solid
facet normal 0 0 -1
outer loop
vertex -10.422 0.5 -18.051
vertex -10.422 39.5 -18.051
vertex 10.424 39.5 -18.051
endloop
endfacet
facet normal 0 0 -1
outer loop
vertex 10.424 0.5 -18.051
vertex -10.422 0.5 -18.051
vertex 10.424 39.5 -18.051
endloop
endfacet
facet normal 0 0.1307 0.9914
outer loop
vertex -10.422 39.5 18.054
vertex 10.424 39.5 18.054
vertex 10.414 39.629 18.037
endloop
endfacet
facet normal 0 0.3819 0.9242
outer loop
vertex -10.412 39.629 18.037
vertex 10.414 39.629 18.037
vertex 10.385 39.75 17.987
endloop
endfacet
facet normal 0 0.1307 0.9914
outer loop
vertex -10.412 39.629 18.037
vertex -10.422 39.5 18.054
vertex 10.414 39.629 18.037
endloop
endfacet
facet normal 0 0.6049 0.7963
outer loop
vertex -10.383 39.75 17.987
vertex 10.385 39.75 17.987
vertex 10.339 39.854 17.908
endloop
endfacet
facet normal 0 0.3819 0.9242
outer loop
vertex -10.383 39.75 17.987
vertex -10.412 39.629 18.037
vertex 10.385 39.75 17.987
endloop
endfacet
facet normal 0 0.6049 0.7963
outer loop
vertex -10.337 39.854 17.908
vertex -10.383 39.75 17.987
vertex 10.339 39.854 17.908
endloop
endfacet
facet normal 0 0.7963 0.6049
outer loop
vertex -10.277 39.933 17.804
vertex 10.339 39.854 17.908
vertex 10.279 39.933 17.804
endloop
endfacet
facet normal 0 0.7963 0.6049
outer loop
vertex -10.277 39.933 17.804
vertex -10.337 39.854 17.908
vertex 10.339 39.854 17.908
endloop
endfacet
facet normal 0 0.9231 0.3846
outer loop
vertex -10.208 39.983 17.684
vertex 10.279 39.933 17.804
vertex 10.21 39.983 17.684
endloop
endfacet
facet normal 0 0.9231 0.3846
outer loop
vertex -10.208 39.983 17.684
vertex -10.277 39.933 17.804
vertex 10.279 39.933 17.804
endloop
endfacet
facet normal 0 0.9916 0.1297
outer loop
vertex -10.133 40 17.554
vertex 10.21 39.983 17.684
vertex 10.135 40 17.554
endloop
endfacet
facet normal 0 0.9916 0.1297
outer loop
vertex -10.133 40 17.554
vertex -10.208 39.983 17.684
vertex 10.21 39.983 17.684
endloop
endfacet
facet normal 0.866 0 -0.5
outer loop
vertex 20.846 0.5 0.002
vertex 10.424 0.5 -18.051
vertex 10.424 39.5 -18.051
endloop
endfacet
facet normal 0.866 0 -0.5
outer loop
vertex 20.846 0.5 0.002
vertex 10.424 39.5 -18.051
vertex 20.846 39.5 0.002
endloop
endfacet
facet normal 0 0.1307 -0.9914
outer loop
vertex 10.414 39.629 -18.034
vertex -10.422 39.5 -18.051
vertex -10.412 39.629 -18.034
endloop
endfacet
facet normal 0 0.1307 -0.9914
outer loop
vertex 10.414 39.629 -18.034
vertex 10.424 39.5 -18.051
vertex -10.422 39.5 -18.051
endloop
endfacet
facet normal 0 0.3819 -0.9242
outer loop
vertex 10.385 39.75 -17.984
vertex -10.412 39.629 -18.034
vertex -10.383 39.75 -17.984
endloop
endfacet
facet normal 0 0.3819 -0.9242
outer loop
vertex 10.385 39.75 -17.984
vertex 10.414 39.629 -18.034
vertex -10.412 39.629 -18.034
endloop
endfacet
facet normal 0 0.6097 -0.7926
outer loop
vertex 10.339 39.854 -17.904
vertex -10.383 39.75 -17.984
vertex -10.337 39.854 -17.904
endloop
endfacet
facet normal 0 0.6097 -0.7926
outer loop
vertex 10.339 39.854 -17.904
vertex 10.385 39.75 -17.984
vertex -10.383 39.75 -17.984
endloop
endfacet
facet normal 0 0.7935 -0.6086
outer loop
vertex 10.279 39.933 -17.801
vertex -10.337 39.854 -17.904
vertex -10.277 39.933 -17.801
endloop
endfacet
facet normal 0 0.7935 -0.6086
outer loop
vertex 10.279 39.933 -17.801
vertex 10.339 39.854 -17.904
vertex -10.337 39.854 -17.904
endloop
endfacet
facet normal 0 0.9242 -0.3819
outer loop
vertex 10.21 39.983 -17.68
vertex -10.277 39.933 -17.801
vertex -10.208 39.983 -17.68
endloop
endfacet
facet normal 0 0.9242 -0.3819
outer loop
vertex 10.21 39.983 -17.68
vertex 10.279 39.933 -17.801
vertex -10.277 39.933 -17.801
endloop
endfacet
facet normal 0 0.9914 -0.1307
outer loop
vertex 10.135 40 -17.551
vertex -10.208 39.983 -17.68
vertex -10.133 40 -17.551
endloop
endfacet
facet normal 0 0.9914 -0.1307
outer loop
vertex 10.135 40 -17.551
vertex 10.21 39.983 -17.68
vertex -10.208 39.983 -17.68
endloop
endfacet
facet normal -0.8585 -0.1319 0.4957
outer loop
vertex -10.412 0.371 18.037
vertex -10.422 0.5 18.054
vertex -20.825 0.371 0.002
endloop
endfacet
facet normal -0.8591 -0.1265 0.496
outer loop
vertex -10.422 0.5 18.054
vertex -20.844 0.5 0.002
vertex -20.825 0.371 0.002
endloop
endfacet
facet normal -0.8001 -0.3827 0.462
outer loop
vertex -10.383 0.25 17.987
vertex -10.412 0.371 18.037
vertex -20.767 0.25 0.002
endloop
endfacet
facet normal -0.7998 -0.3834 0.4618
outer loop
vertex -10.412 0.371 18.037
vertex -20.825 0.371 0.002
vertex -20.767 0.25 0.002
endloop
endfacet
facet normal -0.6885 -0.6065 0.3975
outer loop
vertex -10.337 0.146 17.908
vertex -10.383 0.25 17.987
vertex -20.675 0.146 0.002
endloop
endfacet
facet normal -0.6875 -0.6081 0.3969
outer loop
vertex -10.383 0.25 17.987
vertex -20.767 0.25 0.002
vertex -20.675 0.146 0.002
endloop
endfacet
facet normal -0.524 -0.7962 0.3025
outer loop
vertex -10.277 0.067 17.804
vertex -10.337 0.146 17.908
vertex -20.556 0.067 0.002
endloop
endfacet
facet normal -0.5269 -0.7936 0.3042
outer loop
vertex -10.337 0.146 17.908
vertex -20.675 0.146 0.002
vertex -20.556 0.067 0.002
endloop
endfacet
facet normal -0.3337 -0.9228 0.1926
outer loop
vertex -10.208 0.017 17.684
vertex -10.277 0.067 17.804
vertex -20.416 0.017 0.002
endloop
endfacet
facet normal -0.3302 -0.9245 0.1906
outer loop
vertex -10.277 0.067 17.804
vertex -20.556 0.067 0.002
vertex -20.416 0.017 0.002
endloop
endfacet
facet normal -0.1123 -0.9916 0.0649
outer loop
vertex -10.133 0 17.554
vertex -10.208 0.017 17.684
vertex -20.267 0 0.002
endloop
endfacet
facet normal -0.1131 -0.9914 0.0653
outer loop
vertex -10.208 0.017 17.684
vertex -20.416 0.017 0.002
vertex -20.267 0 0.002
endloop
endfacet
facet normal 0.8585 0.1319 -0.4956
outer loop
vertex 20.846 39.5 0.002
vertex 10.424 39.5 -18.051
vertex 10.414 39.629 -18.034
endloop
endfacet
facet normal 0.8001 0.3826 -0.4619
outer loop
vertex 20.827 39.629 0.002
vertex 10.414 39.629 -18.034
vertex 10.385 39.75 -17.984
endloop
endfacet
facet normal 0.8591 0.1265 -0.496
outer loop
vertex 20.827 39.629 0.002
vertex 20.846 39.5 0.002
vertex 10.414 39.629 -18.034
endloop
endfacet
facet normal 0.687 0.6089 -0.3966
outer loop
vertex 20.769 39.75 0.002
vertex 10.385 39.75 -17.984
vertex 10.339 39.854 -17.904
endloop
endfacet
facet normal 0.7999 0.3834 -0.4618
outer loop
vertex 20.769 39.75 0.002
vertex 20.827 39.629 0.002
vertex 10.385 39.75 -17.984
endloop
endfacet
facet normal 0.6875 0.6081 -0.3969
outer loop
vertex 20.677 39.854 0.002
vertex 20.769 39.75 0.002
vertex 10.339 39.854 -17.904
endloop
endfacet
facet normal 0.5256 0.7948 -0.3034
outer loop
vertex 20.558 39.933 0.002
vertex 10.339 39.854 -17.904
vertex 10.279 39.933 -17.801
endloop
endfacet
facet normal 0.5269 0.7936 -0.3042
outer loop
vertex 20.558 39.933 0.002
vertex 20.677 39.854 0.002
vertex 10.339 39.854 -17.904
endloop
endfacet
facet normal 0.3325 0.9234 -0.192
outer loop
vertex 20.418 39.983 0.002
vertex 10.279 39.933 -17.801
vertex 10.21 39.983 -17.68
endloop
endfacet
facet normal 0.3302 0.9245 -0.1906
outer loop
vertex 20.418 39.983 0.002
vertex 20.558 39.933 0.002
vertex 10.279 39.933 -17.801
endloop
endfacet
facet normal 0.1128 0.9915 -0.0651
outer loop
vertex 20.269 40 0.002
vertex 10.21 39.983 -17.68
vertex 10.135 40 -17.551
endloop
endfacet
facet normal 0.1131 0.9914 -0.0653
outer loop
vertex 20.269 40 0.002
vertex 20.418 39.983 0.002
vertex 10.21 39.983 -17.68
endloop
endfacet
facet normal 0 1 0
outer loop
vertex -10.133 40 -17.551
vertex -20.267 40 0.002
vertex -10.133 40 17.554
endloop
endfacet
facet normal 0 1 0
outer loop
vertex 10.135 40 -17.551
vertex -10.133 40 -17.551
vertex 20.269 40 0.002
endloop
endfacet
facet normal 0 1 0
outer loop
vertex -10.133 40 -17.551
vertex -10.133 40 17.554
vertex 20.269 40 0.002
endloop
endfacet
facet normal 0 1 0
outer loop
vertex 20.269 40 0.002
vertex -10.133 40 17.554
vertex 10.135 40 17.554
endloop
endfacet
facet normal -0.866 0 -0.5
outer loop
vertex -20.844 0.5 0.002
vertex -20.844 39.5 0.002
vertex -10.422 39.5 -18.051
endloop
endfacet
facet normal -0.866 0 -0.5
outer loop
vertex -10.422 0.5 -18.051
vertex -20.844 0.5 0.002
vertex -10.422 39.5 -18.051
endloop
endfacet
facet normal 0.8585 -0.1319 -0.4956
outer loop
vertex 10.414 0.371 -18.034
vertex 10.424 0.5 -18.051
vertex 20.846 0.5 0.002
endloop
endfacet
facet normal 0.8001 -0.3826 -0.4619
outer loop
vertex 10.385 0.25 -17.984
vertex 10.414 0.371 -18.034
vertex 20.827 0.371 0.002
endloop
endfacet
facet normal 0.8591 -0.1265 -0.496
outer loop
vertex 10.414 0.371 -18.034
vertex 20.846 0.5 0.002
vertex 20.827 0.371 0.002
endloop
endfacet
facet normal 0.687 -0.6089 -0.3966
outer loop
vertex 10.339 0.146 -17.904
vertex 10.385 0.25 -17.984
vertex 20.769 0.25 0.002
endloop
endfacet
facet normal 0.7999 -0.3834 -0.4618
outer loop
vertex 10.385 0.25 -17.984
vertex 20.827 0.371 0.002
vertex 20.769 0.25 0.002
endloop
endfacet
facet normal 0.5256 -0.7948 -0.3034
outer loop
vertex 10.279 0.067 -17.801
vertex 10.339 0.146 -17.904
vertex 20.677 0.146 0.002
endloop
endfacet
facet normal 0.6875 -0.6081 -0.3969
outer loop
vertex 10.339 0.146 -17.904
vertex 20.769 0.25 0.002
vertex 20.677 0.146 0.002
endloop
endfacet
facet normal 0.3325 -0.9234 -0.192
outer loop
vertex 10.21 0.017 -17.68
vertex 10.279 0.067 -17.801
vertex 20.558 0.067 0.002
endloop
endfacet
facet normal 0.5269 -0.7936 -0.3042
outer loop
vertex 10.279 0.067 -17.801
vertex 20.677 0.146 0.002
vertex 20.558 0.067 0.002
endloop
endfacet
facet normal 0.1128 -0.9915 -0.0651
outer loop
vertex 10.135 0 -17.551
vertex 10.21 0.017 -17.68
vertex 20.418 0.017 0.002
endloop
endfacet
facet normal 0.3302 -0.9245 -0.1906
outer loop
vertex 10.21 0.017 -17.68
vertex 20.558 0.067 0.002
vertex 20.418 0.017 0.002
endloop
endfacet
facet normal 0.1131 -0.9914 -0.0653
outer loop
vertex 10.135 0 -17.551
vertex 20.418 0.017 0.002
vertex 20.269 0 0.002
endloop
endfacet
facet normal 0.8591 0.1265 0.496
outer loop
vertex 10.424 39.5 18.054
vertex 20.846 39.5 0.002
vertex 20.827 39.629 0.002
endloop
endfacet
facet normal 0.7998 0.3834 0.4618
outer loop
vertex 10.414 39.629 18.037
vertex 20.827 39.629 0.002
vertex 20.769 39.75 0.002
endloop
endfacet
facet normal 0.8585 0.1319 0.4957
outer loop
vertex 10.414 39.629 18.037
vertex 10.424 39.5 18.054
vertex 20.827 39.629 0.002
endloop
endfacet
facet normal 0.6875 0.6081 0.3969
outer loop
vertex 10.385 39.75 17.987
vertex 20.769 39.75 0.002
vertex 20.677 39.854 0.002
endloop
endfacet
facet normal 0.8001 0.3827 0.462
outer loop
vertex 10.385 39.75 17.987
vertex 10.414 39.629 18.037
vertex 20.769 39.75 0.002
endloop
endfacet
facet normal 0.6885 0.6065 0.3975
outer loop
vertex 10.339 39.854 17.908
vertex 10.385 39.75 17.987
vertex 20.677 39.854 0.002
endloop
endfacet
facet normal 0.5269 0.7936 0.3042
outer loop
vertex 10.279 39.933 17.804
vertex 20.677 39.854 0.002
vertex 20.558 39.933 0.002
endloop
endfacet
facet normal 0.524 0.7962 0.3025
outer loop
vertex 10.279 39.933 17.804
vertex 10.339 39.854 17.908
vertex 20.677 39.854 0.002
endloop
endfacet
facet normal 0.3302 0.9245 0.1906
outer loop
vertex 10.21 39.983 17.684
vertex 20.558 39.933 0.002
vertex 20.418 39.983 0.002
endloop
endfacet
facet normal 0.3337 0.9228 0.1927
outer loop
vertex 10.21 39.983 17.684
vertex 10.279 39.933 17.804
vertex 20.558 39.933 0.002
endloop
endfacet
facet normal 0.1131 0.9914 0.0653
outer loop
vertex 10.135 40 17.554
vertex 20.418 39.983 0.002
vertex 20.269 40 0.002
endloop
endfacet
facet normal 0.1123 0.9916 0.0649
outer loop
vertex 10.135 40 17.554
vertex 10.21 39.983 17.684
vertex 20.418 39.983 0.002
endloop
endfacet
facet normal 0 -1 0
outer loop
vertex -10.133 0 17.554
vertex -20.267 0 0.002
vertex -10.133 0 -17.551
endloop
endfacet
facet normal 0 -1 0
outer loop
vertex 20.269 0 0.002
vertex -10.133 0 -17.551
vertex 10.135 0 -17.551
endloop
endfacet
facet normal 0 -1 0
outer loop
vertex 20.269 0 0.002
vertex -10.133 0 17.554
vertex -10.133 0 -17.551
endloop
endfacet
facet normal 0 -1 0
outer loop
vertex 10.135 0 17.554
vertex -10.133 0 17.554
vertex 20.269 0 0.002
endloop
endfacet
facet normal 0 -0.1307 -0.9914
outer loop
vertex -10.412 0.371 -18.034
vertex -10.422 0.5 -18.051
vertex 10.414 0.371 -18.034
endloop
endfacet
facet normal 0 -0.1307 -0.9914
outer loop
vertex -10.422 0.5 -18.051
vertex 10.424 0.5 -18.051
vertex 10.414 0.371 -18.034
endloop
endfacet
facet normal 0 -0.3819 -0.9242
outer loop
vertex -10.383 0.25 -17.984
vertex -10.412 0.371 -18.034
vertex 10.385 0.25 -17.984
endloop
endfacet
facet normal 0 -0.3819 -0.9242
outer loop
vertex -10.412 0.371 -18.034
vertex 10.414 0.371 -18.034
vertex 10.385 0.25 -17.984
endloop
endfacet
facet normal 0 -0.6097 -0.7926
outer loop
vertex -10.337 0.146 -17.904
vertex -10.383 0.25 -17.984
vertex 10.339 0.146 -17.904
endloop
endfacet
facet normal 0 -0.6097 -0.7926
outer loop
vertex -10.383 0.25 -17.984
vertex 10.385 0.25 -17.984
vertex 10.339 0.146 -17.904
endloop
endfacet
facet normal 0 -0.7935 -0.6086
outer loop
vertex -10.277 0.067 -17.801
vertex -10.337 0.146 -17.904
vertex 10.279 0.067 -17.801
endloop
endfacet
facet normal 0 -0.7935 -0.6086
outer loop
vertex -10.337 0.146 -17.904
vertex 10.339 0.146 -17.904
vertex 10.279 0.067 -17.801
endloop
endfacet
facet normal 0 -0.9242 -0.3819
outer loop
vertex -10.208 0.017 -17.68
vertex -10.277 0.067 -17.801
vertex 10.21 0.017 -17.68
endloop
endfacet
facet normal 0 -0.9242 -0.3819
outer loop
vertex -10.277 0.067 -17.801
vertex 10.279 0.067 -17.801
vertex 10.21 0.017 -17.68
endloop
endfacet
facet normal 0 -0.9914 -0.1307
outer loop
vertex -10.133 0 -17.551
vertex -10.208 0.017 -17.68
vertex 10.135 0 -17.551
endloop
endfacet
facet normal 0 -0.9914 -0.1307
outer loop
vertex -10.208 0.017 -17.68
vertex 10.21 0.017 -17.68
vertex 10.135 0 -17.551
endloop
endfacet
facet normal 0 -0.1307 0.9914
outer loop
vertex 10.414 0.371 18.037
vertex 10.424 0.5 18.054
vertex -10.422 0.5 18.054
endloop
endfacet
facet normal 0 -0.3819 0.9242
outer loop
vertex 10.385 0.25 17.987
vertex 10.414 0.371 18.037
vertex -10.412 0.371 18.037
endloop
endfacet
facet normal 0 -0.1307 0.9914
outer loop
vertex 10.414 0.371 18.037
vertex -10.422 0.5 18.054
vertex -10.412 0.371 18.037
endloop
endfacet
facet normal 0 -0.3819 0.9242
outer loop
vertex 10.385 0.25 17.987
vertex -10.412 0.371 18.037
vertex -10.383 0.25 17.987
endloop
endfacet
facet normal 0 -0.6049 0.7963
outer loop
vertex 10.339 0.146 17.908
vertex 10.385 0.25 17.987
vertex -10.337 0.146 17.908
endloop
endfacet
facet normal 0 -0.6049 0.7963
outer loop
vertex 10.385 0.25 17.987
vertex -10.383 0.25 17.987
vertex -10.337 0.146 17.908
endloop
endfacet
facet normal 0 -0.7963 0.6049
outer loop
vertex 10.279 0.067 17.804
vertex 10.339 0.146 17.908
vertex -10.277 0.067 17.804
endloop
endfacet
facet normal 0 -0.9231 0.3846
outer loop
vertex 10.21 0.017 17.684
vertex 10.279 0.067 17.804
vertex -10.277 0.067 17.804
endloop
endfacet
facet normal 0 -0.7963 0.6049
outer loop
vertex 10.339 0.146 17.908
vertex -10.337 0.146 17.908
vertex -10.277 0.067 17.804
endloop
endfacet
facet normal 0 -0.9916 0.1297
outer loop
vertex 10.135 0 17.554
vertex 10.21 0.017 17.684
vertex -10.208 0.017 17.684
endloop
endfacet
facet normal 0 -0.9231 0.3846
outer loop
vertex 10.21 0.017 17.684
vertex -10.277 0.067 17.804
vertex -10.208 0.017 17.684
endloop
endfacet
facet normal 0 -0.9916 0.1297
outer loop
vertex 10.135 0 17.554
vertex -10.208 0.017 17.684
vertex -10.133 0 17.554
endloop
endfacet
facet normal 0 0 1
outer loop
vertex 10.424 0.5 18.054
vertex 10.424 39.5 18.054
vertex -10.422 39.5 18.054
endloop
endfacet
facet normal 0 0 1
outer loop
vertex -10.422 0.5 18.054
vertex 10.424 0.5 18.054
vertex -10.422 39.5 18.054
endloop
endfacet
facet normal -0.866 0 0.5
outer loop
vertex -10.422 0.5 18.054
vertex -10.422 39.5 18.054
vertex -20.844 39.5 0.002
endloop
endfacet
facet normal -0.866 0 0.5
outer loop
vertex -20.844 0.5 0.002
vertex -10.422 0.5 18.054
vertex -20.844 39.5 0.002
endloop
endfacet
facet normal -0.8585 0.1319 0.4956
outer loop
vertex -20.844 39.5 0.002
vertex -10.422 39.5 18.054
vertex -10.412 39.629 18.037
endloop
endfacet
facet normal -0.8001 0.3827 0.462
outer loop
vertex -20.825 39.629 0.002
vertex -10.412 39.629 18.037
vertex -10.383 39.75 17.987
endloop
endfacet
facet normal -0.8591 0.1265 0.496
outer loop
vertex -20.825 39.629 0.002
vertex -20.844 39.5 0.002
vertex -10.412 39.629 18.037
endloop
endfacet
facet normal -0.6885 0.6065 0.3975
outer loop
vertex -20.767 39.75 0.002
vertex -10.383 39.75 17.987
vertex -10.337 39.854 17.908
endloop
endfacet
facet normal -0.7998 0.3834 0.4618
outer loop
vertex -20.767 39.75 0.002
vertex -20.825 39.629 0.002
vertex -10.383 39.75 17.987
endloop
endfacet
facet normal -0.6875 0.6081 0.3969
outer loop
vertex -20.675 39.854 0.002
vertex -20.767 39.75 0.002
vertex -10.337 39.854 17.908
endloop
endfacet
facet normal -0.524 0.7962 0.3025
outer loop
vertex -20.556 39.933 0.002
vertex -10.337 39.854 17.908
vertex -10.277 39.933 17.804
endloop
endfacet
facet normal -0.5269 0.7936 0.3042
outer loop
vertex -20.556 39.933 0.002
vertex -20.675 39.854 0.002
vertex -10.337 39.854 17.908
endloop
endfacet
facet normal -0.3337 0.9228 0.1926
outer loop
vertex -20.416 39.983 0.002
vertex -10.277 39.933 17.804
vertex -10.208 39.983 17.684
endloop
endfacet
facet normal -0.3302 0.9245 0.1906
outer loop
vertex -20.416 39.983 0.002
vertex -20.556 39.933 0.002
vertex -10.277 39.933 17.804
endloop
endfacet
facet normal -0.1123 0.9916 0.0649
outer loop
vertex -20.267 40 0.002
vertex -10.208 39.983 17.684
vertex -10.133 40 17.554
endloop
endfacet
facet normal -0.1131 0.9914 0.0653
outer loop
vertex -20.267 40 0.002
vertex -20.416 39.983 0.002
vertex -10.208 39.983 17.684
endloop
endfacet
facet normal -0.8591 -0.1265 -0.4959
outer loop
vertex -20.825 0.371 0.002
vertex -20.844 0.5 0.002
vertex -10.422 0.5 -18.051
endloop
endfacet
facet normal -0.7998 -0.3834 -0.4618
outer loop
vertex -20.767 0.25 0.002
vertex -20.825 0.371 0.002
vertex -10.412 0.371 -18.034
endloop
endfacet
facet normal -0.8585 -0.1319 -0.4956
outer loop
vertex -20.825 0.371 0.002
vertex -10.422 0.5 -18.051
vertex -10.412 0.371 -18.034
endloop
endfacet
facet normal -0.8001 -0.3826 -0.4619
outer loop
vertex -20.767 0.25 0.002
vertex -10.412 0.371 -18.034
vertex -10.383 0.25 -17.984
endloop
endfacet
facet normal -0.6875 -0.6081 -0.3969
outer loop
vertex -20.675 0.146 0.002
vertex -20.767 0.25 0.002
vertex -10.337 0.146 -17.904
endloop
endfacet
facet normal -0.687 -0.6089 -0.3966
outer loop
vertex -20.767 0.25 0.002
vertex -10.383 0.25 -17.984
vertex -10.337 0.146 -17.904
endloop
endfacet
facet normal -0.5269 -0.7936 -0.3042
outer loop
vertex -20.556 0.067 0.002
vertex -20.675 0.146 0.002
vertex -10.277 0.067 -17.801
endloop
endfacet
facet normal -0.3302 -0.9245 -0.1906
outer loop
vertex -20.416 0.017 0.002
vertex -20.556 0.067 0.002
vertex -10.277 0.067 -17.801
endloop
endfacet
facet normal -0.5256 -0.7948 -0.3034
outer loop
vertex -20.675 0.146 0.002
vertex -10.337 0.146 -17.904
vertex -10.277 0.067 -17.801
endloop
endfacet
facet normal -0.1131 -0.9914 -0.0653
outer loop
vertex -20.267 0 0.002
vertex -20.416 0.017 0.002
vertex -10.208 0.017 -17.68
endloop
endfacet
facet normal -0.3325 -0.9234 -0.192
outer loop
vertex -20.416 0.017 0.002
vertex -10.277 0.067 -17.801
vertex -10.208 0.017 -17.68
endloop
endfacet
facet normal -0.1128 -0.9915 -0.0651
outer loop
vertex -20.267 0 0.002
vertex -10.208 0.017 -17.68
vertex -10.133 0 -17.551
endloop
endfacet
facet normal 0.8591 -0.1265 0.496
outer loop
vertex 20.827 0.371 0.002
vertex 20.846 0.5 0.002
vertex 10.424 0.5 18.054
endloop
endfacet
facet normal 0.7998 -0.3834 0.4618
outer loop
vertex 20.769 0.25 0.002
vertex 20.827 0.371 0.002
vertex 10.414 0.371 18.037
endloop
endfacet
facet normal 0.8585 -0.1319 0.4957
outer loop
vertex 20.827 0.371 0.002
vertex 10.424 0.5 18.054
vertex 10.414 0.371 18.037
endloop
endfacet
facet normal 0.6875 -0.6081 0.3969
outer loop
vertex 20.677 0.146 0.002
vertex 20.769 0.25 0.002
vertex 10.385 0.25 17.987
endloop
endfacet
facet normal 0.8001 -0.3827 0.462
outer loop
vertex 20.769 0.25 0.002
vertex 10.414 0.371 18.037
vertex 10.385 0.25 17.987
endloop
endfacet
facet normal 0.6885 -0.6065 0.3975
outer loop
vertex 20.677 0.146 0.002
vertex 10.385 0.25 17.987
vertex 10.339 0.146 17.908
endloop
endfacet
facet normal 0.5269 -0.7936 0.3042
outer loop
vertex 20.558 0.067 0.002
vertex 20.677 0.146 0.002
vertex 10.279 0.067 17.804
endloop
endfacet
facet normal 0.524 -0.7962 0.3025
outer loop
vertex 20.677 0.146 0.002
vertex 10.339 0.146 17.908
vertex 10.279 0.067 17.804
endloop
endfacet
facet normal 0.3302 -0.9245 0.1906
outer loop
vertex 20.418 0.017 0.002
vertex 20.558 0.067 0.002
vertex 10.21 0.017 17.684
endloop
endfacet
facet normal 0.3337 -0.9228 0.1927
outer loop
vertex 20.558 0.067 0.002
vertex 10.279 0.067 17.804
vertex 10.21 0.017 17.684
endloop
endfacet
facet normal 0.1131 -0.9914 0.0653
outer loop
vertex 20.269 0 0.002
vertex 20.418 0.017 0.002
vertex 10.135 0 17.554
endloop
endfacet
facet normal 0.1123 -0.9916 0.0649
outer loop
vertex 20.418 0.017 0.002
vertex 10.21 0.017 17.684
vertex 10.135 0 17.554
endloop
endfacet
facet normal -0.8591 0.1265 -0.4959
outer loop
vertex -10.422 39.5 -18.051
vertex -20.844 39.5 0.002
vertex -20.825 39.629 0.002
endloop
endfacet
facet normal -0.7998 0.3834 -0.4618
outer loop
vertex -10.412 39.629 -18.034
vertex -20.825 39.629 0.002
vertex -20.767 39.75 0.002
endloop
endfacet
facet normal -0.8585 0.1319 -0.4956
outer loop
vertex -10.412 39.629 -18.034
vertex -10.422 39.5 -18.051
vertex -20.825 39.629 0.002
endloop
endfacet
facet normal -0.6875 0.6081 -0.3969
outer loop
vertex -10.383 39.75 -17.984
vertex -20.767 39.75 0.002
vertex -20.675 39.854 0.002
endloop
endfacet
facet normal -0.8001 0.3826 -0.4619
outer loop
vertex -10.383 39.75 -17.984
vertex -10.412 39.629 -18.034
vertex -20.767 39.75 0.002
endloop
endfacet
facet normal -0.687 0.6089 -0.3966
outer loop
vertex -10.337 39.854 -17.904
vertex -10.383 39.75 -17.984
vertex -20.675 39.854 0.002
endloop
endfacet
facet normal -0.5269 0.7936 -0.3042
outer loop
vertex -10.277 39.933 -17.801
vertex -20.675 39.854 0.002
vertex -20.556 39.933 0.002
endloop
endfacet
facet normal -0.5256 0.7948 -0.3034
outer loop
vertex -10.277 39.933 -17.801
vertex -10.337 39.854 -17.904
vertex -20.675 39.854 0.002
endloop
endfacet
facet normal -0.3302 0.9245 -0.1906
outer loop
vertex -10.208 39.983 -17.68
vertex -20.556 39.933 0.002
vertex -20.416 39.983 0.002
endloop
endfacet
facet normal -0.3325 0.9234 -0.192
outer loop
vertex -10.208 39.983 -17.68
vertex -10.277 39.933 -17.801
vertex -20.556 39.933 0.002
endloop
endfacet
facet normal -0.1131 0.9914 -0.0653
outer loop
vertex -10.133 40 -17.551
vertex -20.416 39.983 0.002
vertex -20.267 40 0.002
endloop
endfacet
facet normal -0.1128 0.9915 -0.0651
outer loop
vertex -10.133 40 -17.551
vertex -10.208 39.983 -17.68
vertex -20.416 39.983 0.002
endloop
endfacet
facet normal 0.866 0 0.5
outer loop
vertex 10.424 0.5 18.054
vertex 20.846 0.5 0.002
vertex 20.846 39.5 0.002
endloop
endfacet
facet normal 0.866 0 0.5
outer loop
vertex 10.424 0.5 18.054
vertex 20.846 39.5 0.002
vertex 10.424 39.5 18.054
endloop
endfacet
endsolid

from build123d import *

# Parameters (mm, degrees)
BOSS_EXTRUDE1_DEPTH = 40
FILLET1_R           = 0.5


with BuildPart() as part:
    # Sketch1 → Boss-Extrude1 (new body)
    with BuildSketch(Plane(origin=(0, 0, 0), x_dir=(-1, 0, 0), z_dir=(0, 1, 0))):
        Polygon((-10.423602647, 18.05420848), (10.421696815, 18.05420848), (20.844346546, 0.001649597), (10.421696815, -18.050909286), (-10.423602647, -18.050909286), (-20.846252377, 0.001649597), align=None)
    extrude(amount=BOSS_EXTRUDE1_DEPTH)

    # Fillet1
    fillet1_edges = [part.edges().sort_by_distance(p)[0] for p in [
        (0.000952916, 40, -18.050909286),
        (-15.63302168, 40, -9.024629844),
        (-15.63302168, 40, 9.027929039),
        (0.000952916, 40, 18.05420848),
        (15.634927512, 40, 9.027929039),
        (0.000952916, 0, 18.05420848),
        (-15.63302168, 0, 9.027929039),
        (-15.63302168, 0, -9.024629844),
        (0.000952916, 0, -18.050909286),
        (15.634927512, 0, -9.024629844),
        (15.634927512, 0, 9.027929039),
        (15.634927512, 40, -9.024629844),
    ]]
    fillet(fillet1_edges, radius=FILLET1_R)


solid = part.part
